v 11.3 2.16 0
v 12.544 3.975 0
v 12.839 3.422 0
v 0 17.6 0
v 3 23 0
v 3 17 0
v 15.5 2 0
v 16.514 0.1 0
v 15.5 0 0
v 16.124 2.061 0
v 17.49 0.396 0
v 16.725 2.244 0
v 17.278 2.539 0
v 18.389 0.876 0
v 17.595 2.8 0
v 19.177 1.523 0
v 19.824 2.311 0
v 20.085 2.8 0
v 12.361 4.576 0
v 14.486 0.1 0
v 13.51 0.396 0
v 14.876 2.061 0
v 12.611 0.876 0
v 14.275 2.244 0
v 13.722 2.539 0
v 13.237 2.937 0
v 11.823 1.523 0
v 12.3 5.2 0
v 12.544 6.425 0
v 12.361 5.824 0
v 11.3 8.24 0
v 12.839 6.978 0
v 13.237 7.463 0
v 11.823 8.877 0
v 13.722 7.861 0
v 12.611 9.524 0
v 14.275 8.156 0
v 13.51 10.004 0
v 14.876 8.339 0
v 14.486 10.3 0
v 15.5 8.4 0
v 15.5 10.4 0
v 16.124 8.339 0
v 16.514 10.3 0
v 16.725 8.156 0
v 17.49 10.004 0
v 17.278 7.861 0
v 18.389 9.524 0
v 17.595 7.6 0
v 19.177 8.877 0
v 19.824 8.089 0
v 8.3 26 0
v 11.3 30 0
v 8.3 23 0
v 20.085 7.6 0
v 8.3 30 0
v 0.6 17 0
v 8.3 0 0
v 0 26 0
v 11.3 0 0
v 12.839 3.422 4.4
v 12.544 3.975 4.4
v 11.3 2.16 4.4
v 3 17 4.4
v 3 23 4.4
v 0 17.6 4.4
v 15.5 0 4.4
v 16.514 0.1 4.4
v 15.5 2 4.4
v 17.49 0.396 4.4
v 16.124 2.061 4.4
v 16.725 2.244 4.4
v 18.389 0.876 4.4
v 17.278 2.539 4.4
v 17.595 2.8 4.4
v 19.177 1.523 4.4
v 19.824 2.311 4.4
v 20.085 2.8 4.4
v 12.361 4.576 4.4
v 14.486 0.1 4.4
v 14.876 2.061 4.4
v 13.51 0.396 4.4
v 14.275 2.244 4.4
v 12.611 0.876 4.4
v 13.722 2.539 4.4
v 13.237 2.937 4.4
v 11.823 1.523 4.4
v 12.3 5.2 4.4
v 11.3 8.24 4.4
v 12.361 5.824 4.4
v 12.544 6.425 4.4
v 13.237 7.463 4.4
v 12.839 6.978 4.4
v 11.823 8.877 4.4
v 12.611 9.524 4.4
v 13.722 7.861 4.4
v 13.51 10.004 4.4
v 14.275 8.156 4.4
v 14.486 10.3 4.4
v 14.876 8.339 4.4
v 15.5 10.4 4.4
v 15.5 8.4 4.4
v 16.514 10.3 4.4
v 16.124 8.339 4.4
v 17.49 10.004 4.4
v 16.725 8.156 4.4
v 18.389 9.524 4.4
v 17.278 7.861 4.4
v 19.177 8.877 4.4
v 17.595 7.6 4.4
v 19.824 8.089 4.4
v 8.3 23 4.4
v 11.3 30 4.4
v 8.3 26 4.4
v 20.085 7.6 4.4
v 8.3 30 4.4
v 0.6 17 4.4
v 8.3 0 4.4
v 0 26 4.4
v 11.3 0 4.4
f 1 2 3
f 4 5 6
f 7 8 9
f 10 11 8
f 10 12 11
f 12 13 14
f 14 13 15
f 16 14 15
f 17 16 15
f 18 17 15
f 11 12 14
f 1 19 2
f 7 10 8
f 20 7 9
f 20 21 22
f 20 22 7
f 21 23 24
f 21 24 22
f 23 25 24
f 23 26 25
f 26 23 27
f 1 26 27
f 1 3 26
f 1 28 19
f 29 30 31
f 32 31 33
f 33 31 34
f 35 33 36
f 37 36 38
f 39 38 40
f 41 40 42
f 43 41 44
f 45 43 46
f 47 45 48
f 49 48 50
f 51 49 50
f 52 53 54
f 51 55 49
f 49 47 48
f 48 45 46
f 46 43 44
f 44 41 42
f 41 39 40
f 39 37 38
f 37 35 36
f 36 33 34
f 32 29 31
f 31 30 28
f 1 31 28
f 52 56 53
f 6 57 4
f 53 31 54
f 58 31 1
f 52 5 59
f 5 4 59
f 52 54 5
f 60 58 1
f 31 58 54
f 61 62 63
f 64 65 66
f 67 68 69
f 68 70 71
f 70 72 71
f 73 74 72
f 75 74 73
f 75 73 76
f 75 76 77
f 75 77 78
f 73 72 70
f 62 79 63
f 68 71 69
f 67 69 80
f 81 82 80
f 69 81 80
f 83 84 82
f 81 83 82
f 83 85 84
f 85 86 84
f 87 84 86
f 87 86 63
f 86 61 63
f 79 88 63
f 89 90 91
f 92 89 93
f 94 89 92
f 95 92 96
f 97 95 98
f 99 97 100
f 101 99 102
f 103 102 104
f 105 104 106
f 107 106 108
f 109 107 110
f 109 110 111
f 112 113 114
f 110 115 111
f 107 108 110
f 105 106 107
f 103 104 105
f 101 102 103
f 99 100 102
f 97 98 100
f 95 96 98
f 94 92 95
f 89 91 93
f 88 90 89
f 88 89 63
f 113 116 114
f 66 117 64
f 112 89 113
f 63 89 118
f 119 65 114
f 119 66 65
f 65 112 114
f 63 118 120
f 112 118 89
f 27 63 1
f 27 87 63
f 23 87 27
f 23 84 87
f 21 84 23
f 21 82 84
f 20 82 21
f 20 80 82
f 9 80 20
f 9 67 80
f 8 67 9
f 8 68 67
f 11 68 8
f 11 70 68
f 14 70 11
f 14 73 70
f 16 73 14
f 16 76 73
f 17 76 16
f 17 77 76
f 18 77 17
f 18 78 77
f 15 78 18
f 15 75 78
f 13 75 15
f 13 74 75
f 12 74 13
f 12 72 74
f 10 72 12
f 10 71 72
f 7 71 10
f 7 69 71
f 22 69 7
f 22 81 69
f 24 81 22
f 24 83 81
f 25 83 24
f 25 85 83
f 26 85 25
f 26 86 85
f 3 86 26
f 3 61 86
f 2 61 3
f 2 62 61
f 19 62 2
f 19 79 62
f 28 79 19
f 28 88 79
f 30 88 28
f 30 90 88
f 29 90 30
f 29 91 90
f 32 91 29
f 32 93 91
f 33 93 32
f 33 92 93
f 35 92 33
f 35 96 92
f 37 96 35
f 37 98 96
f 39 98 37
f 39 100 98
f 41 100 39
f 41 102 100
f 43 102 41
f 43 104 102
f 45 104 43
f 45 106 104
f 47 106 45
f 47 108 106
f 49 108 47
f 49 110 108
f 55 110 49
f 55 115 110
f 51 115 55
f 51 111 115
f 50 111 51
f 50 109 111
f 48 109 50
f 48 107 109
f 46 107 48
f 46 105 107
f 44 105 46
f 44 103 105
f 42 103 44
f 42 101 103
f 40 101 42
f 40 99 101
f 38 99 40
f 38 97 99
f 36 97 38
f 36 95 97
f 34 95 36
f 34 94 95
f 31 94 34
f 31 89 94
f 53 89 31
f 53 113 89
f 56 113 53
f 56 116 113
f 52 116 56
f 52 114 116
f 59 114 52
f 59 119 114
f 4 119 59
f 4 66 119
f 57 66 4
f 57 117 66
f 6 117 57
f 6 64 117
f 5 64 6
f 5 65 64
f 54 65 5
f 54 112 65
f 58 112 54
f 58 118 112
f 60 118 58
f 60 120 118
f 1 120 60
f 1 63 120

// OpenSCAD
// SKADIS cable keeper: a sideways-opening C cradle for one flexible cable.
// Print flat on its broad side as laid out; no supports. Use PETG and
// 4 perimeters. Feed the cable along the bore or gently through the mouth.
// Insert the rear tooth in the board, then lower until its neck seats.
// Lift before removing. This guides a cable; it is not a strain relief.
// Dimensions: nominal 5 x 15 mm obround slots, 5 mm board thickness.
// Adjacent columns: 20 mm; alternate columns offset vertically by 20 mm.
// Same-height slots and same-column slots repeat every 40 mm.
// Measurement references (geometry below is original, not copied):
// https://www.reddit.com/r/ikeahacks/comments/rk2qk0/
// https://www.printables.com/model/109009-ikea-skadis-hook-hacek-10mm-100mm
// https://github.com/sebasdv/skadisgen (staggered grid only).
// Print the small hook first to tune fit; physical fit/load not yet tested.

cable_diameter = 6; // Cable diameter before running clearance, mm [4:0.5:10]
cable_clearance = 0.4; // Added bore diameter, mm [0.2:0.1:0.6]
mouth_ratio = 0.8; // Mouth width as a fraction of cable diameter [0.7:0.05:1]
ring_wall = 2; // Material around cable, mm [1.6:0.2:2.4]
board_thickness = 5; // Measured board thickness, mm [4.6:0.1:5.4]
tolerance = 0.3; // Clearance per slot side and behind board, mm [0.2:0.05:0.4]

$fn = 32; // Circle facets
slot_width = 5; // Nominal slot width, mm
clip_width = slot_width-2*tolerance; // Blade thickness across slot, mm
board_gap = board_thickness+tolerance; // Clearance behind front bearing face, mm

bore_radius = (cable_diameter+cable_clearance)/2; // Cable bore radius, mm
outer_radius = bore_radius+ring_wall; // Outside cradle radius, mm
mouth = cable_diameter*mouth_ratio; // Entry opening, mm

// Shared SKADIS profile, in [depth from board, height] coordinates.
// Front bearing face is depth 0; board occupies depth -board_thickness..0.
// A 3 mm neck at height 23..26 passes through the slot; the rear tooth
// reaches height 17, extending 6 mm below the neck to catch behind the board.
// Centre the 9 mm tall tooth in the slot's 10 mm straight middle to insert.
// At default tolerance its 4.4 mm width leaves 0.3 mm on each slot side;
// board_gap leaves another 0.3 mm behind the board before pulling forward.
// Lower until the neck corners bear on the rounded slot bottom (contact is
// intentional). Lift about 8 mm at default fit to centre the tooth for removal.
// Verified against a separate 5 x 15 mm obround-slot board via the dev API;
// Insertion/lowering clear; withdrawal catches. See docs/example-feedback/skadis.md.
module skadis_clip_outline() {
    polygon([[0,0],[3,0],[3,30],[0,30],[0,26],
             [-board_gap-3,26],[-board_gap-3,17.6],
             [-board_gap-2.4,17],[-board_gap,17],
             [-board_gap,23],[0,23]]);
}

color("#b48ef0") translate([board_gap+3,0,0])
    linear_extrude(clip_width)
        union() {
            skadis_clip_outline();
            translate([outer_radius+2,outer_radius])
                difference() {
                    circle(r=outer_radius);
                    circle(r=bore_radius);
                    translate([0,-mouth/2])
                        square([outer_radius+1,mouth]);
                }
        }
